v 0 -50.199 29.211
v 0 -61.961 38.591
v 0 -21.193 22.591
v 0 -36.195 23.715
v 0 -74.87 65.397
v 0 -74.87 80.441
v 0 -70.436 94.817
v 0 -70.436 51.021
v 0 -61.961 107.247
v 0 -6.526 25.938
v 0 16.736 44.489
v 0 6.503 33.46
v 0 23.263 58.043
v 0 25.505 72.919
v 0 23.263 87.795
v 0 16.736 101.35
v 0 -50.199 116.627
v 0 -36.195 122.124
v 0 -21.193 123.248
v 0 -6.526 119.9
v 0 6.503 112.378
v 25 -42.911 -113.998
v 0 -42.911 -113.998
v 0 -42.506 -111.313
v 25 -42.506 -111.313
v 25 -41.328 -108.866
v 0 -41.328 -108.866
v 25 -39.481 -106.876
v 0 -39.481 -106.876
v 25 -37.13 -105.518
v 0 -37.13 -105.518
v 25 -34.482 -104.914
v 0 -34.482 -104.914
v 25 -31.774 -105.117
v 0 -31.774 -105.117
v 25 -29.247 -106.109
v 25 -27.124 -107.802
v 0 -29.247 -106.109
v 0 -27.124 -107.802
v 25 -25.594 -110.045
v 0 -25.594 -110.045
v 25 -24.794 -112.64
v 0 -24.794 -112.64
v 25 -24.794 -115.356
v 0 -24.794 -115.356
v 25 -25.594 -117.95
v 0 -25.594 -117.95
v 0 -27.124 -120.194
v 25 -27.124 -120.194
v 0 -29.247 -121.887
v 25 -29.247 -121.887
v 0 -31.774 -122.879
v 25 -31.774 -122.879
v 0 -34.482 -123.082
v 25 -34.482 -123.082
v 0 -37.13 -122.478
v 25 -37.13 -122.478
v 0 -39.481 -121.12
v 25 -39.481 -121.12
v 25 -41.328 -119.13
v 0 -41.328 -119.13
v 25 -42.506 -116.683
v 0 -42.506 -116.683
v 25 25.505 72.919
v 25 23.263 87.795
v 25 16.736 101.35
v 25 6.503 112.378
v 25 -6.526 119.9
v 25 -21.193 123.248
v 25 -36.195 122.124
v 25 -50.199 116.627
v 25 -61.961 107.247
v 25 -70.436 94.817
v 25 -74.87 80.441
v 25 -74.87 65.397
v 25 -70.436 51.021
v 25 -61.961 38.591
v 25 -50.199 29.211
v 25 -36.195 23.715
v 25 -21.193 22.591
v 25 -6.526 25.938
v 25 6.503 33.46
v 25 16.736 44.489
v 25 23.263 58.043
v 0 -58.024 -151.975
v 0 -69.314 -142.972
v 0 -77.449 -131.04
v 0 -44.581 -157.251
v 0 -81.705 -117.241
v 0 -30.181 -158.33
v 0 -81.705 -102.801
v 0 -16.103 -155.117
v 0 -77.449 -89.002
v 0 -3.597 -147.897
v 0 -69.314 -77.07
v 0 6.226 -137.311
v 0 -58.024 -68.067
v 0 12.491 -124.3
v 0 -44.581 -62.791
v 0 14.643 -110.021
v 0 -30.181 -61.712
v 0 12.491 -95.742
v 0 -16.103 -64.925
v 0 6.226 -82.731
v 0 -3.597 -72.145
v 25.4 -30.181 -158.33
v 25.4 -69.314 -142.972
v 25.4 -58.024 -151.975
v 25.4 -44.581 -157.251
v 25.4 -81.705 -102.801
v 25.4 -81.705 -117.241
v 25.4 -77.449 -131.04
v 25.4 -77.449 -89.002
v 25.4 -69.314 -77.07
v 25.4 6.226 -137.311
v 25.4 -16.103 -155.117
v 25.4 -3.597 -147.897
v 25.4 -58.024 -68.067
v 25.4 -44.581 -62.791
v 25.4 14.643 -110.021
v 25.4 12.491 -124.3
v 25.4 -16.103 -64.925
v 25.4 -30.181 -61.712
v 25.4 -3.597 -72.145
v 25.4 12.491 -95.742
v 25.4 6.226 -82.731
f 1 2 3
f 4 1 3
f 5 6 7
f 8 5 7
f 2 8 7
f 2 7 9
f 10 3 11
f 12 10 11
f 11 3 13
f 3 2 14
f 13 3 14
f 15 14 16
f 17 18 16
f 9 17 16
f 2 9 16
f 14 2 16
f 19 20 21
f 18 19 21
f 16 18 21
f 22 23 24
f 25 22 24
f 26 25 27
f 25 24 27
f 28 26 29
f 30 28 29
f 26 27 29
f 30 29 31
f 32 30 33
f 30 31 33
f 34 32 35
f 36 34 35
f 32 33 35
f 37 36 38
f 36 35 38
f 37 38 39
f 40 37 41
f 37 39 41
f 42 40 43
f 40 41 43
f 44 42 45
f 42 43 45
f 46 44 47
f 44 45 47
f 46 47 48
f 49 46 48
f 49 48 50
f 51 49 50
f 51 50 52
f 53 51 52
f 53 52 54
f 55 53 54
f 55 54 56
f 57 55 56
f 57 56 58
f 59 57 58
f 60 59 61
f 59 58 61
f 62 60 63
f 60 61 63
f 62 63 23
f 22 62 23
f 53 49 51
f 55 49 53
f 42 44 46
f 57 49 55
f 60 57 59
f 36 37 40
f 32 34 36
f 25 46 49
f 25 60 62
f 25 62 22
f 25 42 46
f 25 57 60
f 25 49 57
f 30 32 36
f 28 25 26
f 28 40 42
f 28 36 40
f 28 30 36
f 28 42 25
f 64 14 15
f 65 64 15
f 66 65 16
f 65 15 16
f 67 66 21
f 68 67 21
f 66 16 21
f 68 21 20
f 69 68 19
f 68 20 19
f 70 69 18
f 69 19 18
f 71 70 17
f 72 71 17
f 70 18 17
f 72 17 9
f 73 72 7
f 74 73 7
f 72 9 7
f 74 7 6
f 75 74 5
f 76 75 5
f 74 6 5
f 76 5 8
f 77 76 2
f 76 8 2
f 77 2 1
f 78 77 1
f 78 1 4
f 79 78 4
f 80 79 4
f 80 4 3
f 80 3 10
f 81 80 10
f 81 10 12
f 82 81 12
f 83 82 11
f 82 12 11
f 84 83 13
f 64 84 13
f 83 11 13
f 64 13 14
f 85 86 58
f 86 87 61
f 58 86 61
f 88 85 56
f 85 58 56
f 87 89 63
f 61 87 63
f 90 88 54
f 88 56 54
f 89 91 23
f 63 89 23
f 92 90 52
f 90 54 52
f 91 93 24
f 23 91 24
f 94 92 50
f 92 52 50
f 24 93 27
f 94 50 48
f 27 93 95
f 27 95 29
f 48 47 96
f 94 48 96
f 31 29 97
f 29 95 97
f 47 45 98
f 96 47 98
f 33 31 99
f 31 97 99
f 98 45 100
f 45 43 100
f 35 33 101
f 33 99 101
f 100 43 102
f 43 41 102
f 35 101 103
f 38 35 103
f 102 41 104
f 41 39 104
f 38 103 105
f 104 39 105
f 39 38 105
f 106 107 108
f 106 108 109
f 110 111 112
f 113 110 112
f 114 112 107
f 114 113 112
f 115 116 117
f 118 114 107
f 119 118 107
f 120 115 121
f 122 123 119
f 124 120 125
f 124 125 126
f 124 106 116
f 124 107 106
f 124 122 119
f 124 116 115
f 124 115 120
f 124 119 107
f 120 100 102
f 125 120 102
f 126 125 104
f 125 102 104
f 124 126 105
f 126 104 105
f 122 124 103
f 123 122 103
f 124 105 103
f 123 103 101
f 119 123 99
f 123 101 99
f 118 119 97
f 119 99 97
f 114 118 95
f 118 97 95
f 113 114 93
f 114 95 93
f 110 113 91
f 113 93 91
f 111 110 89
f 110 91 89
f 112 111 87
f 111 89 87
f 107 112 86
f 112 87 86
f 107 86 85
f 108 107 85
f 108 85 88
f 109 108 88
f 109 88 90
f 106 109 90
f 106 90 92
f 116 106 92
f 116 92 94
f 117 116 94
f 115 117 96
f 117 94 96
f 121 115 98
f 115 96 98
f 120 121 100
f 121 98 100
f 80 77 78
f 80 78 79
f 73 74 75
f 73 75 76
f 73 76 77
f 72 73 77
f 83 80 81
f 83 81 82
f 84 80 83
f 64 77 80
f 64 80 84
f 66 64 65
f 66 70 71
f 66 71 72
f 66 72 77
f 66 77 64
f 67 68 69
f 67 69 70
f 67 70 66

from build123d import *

# Parameters (mm, degrees)
F0_R     = 48.444831
F2_DEPTH = 25.4
F1_R     = 50.469705
F3_DEPTH = 25
F4_R     = 9.10957
F5_DEPTH = 25


with BuildPart() as f2:
    # F0 (on Right) → F2 (new body)
    with BuildSketch(Plane.YZ):
        with Locations((-33.801425, -110.020988)):
            Circle(F0_R)
    extrude(amount=F2_DEPTH)

    # F4 (on face) → F5 (cut)
    with BuildSketch(Plane(origin=(0, 0, 0), x_dir=(0, -1, 0), z_dir=(-1, 0, 0))):
        with Locations((33.801425, -113.997951)):
            Circle(F4_R)
    extrude(amount=-F5_DEPTH, mode=Mode.SUBTRACT)


with BuildPart() as f3:
    # F1 (on Right) → F3 (new body)
    with BuildSketch(Plane.YZ):
        with Locations((-24.964452, 72.919242)):
            Circle(F1_R)
    extrude(amount=F3_DEPTH)


solid = Compound([f2.part, f3.part])
